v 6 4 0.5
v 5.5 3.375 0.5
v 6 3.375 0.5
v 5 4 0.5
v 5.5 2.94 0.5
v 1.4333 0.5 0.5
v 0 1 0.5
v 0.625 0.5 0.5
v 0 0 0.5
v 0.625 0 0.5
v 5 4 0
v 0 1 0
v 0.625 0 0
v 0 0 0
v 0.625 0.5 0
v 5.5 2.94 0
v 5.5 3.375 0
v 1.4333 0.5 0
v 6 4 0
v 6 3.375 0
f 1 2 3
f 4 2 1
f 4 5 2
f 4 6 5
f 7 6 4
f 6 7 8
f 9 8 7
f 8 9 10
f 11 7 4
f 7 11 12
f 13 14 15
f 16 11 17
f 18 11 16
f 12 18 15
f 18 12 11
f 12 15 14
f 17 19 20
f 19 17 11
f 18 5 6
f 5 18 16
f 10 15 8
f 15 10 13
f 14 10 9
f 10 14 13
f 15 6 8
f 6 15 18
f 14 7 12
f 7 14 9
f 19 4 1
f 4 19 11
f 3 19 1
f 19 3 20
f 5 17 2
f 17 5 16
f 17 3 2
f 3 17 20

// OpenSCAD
// file: modus.scad
//Corner Joint - allows the sides of two parts to create inlayed corner. Aids with welding.
//need to verify module math is the same throughout all parts.

module cornerjoint(Z,L,H,EndGap,PadL,PadH,CJangle,CJcenter){
    //change so that H = Z of inlayed part (usually 0.5)
    //add center and angle in degrees option, orgin far side of cut out area

     if((CJangle==0)&&(CJcenter==0))
      {    
        translate([0,0,0])
        rotate([0,0,CJangle])
        difference(){
        cube([L,H+PadH,Z]);
        translate([EndGap,H,0])
        cube([PadL,PadH,Z]);
        translate([L-EndGap-PadL,H,0])
        cube([PadL,PadH,Z]);}
      }    
else if((CJangle==90)&&(CJcenter==0))
      {    
        translate([H+PadH,0,0])
        rotate([0,0,CJangle])
        difference(){
        cube([L,H+PadH,Z]);
        translate([EndGap,H,0])
        cube([PadL,PadH,Z]);
        translate([L-EndGap-PadL,H,0])
        cube([PadL,PadH,Z]);}
      }
else if((CJangle==180)&&(CJcenter==0))       
      {    
        translate([L,H+PadH,0])
        rotate([0,0,CJangle])
        difference(){
        cube([L,H+PadH,Z]);
        translate([EndGap,H,0])
        cube([PadL,PadH,Z]);
        translate([L-EndGap-PadL,H,0])
        cube([PadL,PadH,Z]);}
      }
else if((CJangle==270)&&(CJcenter==0))
      {    
        translate([0,L,0])
        rotate([0,0,CJangle])
        difference(){
        cube([L,H+PadH,Z]);
        translate([EndGap,H,0])
        cube([PadL,PadH,Z]);
        translate([L-EndGap-PadL,H,0])
        cube([PadL,PadH,Z]);}
      }  
      
//centered     
   
else if((CJangle==0)&&(CJcenter==1))
      {    
        translate([-L/2,0,0])
        rotate([0,0,CJangle])
        difference(){
        cube([L,H+PadH,Z]);
        translate([EndGap,H,0])
        cube([PadL,PadH,Z]);
        translate([L-EndGap-PadL,H,0])
        cube([PadL,PadH,Z]);}
      }  
else if((CJangle==90)&&(CJcenter==1))
      {    
        translate([0,-L/2,0])
        rotate([0,0,CJangle])
        difference(){
        cube([L,H+PadH,Z]);
        translate([EndGap,H,0])
        cube([PadL,PadH,Z]);
        translate([L-EndGap-PadL,H,0])
        cube([PadL,PadH,Z]);}
      }
else if((CJangle==180)&&(CJcenter==1))       
      {    
        translate([L/2,0,0])
        rotate([0,0,CJangle])
        difference(){
        cube([L,H+PadH,Z]);
        translate([EndGap,H,0])
        cube([PadL,PadH,Z]);
        translate([L-EndGap-PadL,H,0])
        cube([PadL,PadH,Z]);}
      }
else if((CJangle==270)&&(CJcenter==1))
      {    
        translate([0,L/2,0])
        rotate([0,0,CJangle])
        difference(){
        cube([L,H+PadH,Z]);
        translate([EndGap,H,0])
        cube([PadL,PadH,Z]);
        translate([L-EndGap-PadL,H,0])
        cube([PadL,PadH,Z]);}
      }
} //end cornerjoint module

//Tab Insert - used to cut a hole for an abutting part to insert into. Typically aids with welding the two parts.
module tabinsert(X,Y,Z,dGap,cGap,c1,c2,c3,c4,c5,c6,c7,c8,center){
    translate([-dGap-(center*(X/2)),-dGap-(center*(Y/2)),0]){
        //main cut
        cube([X+(dGap*2),Y+(dGap*2),Z]);
        //corner c1c2
        translate([-cGap,(Y+(dGap*2))-c1+cGap,0])
            {
        cube([c2,c1,Z]);}
       //corner c3c4
       translate([(X+(dGap*2))-c3+cGap,(Y+(dGap*2))-c4+cGap,0]){
           cube([c3,c4,Z]);
       }
       //corner c5c6
       translate([(X+(dGap*2))-c6+cGap,-cGap,0])
      {
          cube([c6,c5,Z]);
      }
       
       //corner c7c8 
       translate([-cGap,-cGap,0]){
           cube([c7,c8,Z]);
       }
    
    } //end center translate
} //end tabinsert module
 

module nut(flattoflat,nutheight){  //distance from one flat side to the other flat side "A/F"

//typical sizes found here:
//https://en.wikipedia.org/wiki/Nut_(hardware)

difference(){
    translate([0,0,nutheight/2])
cube(size = [10,10,nutheight], center = true);
    
for(i=[1:6]){
    rotate([0,0,i*60])
difference(){
    translate([-10,0,0])
    cube([20,20,nutheight]);
    translate([-10,0,0])
    cube([20,flattoflat/2,nutheight]);
}  //end difference
}  //end for
}  //end differeence
}  //end module
// file: vars.scad
brickW=6; 
brickL=24;
brickCH=6; //Is brick height being shortened by d1z??

//3.625 x 2.25 x 8
//6 x 12 x 6

grateX=56;
grateY=23;
grateH=37; //Height mounted above press's frame
grateA=17.5; //angle of grate

//grateX=56;
//grateY=23;
//grateH=37; //Height mounted above press's frame
//grateA=17.5; //angle of grate


$fn=8; //defines resolution of circles. 8 is okay for review. 100  or greater should be used for for final dxf export.

dZstandard=0.5; //thickness of steel to be cut for drawer parts
fZstandard=0.5;
aZstandard=0.5; //thickness of steel to be cut for arm parts
hZstandard=0.125;

fBOLTHOLEstandardD=1; //standard bolts used on frame
aBOLTHOLEstandardD=1;

sliderodholeOD=1.2; 
d1bushingOD=1.25;
d1bushingL=1.25;
d1shaftOD=1;
d1bolt1OD=1;
d1bolt2OD=0.75;
d1nut2AF=1.25;
d1nut2H=0.665;


dGap=0.03125; //gap between a hole cut's edge and the part sitting within the hole. //D3 appears to use 0.3125, is this in error?

//all parts set to standard thickness below
//off standard preferences can be defined below

//drawer
drawergap=0.0283;  //extra room for drawer to slide in the space between f1 and f4
drawerHgap=0.1884;  //total extra space from drawer sides to frame walls. sum of both sides.

d2clevispinaccessholeOD=3;

d1z=dZstandard;
d2z=dZstandard;
d3z=dZstandard;
d4z=dZstandard;
d5z=dZstandard;
d6z=dZstandard;
d5z=dZstandard;
d7z=dZstandard;
d8z=dZstandard;
d9z=dZstandard;

d11z=dZstandard;
d12z=dZstandard;


//frame

f1y=6;
f1z=fZstandard;


f2y=3.5;
f2z=fZstandard;

f3y=3.5;
f3z=fZstandard;

f4y=11;
f4z=fZstandard;

f5y=3.5;
f5z=fZstandard;

f6y=8;
f6z=fZstandard;

f8y=brickW;
f8z=fZstandard;
f8boltD=1;

f9y=4.5;

f9z=fZstandard;




f12z=fZstandard;   

f11x=1.25;
f11z=fZstandard;

f13z=fZstandard;

f14y=3.5;
f14z=fZstandard;

//arms

a1x=4;
a1z=aZstandard;
a1out=24; //length from frame to A5 edge for bricks to sit on as they exit

a2x=6;
a2z=aZstandard;

a3x=4;
a3y=72;
a3z=aZstandard;

a4x=6;
a4y=72;
a4z=aZstandard;

a5x=6;
a5y=72;
a5z=aZstandard;

a6z=aZstandard;

//guards

h1x=grateX;
h1y=grateH;  //might need to tweak for grate thickness

h1z=hZstandard;
h2z=hZstandard;
h3z=hZstandard;
h4z=hZstandard;
h5z=hZstandard;
h6z=hZstandard;
h7z=hZstandard;
h8z=hZstandard;

//
//Input your main cylinder's dimenions here
//
cylMainBore = 5;
cylMainStroke = 16;
cylMainExt = 43;
cylMainRet = 27;
cylMainA = (cylMainRet-cylMainStroke); //center to center minus stroke length
cylMainB = 0.25; // cylinder wall thickness
cylMainD = 2.5; //Rod OD
cylMainE = 5.75; //rear pin holder width
cylMainG = 4; //rod pin holder width
cylMainJ = 3.8; //distance from the end of the cylinder body to rod pin center
cylMainR = 1.52; //pin hole ID
cylMainS = 2.5; //pin holder OD

//
//Input your drawer cylinder's dimenions here
//
//
cylDrawerBore = 5;
cylDrawerStroke = 16;
cylDrawerExt = 43;
cylDrawerRet = 27;
cylDrawerA = (cylMainRet-cylMainStroke); //center to center minus stroke length
cylDrawerB = 0.25; // cylinder wall thickness
cylDrawerD = 2.5; //Rod OD
cylDrawerE = 5.75; //rear pin holder width
cylDrawerG = 4; //rod pin holder width
cylDrawerJ = 3.8; //distance from the end of the cylinder body to rod pin center
cylDrawerR = 1.52; //pin hole ID
cylDrawerS = 2.5; //pin holder OD

cylinderDRAWERbodyH=3; //measured when in position, largest length from top to bottom of cylinder
cylinderDRAWERminC2C=0; //drawer's hydraulic cylinder's distance from the center of one mounting hole to the center of the other when fully compressed.
cylinderDRAWERmaxC2C=0; ///drawer's hydraulic cylinder's distance from the center of one mounting hole to the center of the other when fully extended.
cylinderDRAWERrodclevisW=2.5; //width of cylinders' clevis on end of rod
cylinderDRAWERrodclevisID=1;
cylinderDRAWERrodclevisOD=2;
cylinderDRAWERrearclevisW=2.5; //width of mounting clevis cylinder body
cylinderDRAWERrearclevisID=1;
cylinderDRAWERrearclevisOD=2;
cylinderDRAWERrearclevisClearance=3; //usable space around rear clevis pin (in diameter). be aware of hyraulic fittings.

//the following variables are calculated in order of dependence on preceding variables

d3x=brickL+(d2z*2);
d3y=brickCH-d1z;
d4x=brickW+d3z+d3z;
d4y=brickCH-d1z;
d5x=brickL+(d2z*2);
d5y=brickW;
d6x=brickL+(d2z*2);
d6y=brickCH;
d7x=cylinderDRAWERrearclevisClearance;
d7y=a4z+d8z+cylinderDRAWERbodyH;
d9x=cylinderDRAWERbodyH+d6z; //should be based on clevis size?
d9y=cylinderDRAWERbodyH+d8z;
d8x=brickL+(d2z*2);
d8y=max(5,(d9x-d6z));   //need to review fundamentals, 5 minimun unless d9 gets larger than d8
d11x=1.5+(d1bolt1OD*2)+d1bushingOD;
d11y=max((0.5+d1bushingL),4);

d12x=d8x;
d12y=d11y+1;

f1x=((brickL+(d2z*2)+drawerHgap+(f9y*2)));
f3x=f1x;

d1x=(brickL+d2z+d2z);
//d1x=(((f1x/2)-(((brickL+(d2z*2)+drawerHgap)/2)-fZstandard-(sliderodholeOD/2)))+(d11x/2))*2;
d1y=((brickW+d3z+d3z)*3)+1;

d2x=d8y+d6z+brickW+d3z+d5y+d3z;
d2y=brickCH;



f11y=f8y;
f6x=brickL+(d2z*2)+(f9y*2)+drawerHgap;

f9x=(f2z+((cylMainS+0.125)/2)+cylMainRet-cylMainJ+1+f4y+drawergap+d2y+f1y);  //leaves 1" between top of cylinder and bottom of F4
f8x=f9x;


f2x=brickL+(d2z*2)+drawerHgap+(f9y*2)-(1.4*2);  //distance between large cut outs in f9

f5x=brickL+(d2z*2)+drawerHgap+(f9y*2)+(a1x*2); //distance between outer edges of each A1

f4x=f5x-0.5;   //same as f5 but minus 0.25 on each side to give a little overhang

f14x=brickL+(1*2)+(.125*2)+(dGap*2); 

f12x=f3x;
f12y=(f3y*2)+brickW;

sliderodoffset=(((brickL+(d2z*2)+drawerHgap)/2)-fZstandard-(sliderodholeOD/2));

distancetof8center=(cylDrawerExt+(a4x/2)+((d9x-d6z)/2)+d6z+(brickW/2)); //F8 center on A1

a1y=distancetof8center+(brickW/2)+a1out;
a2y=a1y;

h7x=f5x-((a1x/2)*2)+(1.5*2);
h7y=cylDrawerStroke;

h8x=f5x-((a1x/2)*2)+(1.5*2);
h8y=a1out-a5x-f5y;  //distance between a5 and f5

hopperBaseX=brickL;
hopperBaseY=brickW;

h2x=grateX;
h2y=sqrt(((h1y-(sin(grateA)*grateY))*(h1y-(sin(grateA)*grateY)))+(((cos(grateA)*grateY)-hopperBaseY)*((cos(grateA)*grateY)-hopperBaseY)));

//h1y-(sin(grateA)*grateY)
//(cos(grateA)*grateY)-hopperBaseY

echo(h1y-(sin(grateA)*grateY));
echo((cos(grateA)*grateY)-hopperBaseY);
echo(h2y);
echo(atan((h1y-(sin(grateA)*grateY))/((cos(grateA)*grateY)-hopperBaseY)));
echo((h1y-(sin(grateA)*grateY))/(h1y));

// ECHO - REQUIRED PARTS BASED ON INPUTS

echo(str("Minimum drawer cylinder stroke length: ",(d3z*2)+d5y+brickW));
//would be cool to validate and confirm user inputed stroke length. set error=1; if drawer cylinder is not long enough. print an echo warning.

echo(str("Grate hieght above ground level: ",(1)));
// main file
include <vars.scad>;
use <modus.scad>;

a6p();

//insert is 0.625"

module a6p(){
    
    X=a2x;
    Y=a1x;
    Zx=a2z;
    Zy=a1z;
    
    W=min(((1)/cos((atan((Y-1)/(X-1))))),((1)/sin((atan((Y-1)/(X-1)))))); 
    //trying to make some overhang for insert to butt up against. not perfect but working
    //trying for 0.5, but not getting there exactly
    
difference(){

union(){

translate([-1/tan(atan((Y-1)/(X-1))),0,0])
rotate([0,0,atan((Y-1)/(X-1))])
translate([0,-W,0])
#cube([50,W,a6z]);
    
cube([0.625,Zx,a6z]);
    
translate([X-Zy,Y-0.625,0])
cube([Zy,0.625,a6z]);
} //end union - start difference
        
translate([0.625,0,0])    
cube([100,Zx,a6z]);

translate([-100,-99,0])    
cube([100,100,a6z]);

translate([0,-100,0])    
cube([100,100,a6z]);

translate([0,Y,0])
cube([100,100,a6z]);

translate([X,0,0])
cube([100,100,a6z]);

translate([X-Zy,Y-0.625-100,0])
cube([Zy,100,a6z]);



    } //end difference
    
}  //end a6p module
